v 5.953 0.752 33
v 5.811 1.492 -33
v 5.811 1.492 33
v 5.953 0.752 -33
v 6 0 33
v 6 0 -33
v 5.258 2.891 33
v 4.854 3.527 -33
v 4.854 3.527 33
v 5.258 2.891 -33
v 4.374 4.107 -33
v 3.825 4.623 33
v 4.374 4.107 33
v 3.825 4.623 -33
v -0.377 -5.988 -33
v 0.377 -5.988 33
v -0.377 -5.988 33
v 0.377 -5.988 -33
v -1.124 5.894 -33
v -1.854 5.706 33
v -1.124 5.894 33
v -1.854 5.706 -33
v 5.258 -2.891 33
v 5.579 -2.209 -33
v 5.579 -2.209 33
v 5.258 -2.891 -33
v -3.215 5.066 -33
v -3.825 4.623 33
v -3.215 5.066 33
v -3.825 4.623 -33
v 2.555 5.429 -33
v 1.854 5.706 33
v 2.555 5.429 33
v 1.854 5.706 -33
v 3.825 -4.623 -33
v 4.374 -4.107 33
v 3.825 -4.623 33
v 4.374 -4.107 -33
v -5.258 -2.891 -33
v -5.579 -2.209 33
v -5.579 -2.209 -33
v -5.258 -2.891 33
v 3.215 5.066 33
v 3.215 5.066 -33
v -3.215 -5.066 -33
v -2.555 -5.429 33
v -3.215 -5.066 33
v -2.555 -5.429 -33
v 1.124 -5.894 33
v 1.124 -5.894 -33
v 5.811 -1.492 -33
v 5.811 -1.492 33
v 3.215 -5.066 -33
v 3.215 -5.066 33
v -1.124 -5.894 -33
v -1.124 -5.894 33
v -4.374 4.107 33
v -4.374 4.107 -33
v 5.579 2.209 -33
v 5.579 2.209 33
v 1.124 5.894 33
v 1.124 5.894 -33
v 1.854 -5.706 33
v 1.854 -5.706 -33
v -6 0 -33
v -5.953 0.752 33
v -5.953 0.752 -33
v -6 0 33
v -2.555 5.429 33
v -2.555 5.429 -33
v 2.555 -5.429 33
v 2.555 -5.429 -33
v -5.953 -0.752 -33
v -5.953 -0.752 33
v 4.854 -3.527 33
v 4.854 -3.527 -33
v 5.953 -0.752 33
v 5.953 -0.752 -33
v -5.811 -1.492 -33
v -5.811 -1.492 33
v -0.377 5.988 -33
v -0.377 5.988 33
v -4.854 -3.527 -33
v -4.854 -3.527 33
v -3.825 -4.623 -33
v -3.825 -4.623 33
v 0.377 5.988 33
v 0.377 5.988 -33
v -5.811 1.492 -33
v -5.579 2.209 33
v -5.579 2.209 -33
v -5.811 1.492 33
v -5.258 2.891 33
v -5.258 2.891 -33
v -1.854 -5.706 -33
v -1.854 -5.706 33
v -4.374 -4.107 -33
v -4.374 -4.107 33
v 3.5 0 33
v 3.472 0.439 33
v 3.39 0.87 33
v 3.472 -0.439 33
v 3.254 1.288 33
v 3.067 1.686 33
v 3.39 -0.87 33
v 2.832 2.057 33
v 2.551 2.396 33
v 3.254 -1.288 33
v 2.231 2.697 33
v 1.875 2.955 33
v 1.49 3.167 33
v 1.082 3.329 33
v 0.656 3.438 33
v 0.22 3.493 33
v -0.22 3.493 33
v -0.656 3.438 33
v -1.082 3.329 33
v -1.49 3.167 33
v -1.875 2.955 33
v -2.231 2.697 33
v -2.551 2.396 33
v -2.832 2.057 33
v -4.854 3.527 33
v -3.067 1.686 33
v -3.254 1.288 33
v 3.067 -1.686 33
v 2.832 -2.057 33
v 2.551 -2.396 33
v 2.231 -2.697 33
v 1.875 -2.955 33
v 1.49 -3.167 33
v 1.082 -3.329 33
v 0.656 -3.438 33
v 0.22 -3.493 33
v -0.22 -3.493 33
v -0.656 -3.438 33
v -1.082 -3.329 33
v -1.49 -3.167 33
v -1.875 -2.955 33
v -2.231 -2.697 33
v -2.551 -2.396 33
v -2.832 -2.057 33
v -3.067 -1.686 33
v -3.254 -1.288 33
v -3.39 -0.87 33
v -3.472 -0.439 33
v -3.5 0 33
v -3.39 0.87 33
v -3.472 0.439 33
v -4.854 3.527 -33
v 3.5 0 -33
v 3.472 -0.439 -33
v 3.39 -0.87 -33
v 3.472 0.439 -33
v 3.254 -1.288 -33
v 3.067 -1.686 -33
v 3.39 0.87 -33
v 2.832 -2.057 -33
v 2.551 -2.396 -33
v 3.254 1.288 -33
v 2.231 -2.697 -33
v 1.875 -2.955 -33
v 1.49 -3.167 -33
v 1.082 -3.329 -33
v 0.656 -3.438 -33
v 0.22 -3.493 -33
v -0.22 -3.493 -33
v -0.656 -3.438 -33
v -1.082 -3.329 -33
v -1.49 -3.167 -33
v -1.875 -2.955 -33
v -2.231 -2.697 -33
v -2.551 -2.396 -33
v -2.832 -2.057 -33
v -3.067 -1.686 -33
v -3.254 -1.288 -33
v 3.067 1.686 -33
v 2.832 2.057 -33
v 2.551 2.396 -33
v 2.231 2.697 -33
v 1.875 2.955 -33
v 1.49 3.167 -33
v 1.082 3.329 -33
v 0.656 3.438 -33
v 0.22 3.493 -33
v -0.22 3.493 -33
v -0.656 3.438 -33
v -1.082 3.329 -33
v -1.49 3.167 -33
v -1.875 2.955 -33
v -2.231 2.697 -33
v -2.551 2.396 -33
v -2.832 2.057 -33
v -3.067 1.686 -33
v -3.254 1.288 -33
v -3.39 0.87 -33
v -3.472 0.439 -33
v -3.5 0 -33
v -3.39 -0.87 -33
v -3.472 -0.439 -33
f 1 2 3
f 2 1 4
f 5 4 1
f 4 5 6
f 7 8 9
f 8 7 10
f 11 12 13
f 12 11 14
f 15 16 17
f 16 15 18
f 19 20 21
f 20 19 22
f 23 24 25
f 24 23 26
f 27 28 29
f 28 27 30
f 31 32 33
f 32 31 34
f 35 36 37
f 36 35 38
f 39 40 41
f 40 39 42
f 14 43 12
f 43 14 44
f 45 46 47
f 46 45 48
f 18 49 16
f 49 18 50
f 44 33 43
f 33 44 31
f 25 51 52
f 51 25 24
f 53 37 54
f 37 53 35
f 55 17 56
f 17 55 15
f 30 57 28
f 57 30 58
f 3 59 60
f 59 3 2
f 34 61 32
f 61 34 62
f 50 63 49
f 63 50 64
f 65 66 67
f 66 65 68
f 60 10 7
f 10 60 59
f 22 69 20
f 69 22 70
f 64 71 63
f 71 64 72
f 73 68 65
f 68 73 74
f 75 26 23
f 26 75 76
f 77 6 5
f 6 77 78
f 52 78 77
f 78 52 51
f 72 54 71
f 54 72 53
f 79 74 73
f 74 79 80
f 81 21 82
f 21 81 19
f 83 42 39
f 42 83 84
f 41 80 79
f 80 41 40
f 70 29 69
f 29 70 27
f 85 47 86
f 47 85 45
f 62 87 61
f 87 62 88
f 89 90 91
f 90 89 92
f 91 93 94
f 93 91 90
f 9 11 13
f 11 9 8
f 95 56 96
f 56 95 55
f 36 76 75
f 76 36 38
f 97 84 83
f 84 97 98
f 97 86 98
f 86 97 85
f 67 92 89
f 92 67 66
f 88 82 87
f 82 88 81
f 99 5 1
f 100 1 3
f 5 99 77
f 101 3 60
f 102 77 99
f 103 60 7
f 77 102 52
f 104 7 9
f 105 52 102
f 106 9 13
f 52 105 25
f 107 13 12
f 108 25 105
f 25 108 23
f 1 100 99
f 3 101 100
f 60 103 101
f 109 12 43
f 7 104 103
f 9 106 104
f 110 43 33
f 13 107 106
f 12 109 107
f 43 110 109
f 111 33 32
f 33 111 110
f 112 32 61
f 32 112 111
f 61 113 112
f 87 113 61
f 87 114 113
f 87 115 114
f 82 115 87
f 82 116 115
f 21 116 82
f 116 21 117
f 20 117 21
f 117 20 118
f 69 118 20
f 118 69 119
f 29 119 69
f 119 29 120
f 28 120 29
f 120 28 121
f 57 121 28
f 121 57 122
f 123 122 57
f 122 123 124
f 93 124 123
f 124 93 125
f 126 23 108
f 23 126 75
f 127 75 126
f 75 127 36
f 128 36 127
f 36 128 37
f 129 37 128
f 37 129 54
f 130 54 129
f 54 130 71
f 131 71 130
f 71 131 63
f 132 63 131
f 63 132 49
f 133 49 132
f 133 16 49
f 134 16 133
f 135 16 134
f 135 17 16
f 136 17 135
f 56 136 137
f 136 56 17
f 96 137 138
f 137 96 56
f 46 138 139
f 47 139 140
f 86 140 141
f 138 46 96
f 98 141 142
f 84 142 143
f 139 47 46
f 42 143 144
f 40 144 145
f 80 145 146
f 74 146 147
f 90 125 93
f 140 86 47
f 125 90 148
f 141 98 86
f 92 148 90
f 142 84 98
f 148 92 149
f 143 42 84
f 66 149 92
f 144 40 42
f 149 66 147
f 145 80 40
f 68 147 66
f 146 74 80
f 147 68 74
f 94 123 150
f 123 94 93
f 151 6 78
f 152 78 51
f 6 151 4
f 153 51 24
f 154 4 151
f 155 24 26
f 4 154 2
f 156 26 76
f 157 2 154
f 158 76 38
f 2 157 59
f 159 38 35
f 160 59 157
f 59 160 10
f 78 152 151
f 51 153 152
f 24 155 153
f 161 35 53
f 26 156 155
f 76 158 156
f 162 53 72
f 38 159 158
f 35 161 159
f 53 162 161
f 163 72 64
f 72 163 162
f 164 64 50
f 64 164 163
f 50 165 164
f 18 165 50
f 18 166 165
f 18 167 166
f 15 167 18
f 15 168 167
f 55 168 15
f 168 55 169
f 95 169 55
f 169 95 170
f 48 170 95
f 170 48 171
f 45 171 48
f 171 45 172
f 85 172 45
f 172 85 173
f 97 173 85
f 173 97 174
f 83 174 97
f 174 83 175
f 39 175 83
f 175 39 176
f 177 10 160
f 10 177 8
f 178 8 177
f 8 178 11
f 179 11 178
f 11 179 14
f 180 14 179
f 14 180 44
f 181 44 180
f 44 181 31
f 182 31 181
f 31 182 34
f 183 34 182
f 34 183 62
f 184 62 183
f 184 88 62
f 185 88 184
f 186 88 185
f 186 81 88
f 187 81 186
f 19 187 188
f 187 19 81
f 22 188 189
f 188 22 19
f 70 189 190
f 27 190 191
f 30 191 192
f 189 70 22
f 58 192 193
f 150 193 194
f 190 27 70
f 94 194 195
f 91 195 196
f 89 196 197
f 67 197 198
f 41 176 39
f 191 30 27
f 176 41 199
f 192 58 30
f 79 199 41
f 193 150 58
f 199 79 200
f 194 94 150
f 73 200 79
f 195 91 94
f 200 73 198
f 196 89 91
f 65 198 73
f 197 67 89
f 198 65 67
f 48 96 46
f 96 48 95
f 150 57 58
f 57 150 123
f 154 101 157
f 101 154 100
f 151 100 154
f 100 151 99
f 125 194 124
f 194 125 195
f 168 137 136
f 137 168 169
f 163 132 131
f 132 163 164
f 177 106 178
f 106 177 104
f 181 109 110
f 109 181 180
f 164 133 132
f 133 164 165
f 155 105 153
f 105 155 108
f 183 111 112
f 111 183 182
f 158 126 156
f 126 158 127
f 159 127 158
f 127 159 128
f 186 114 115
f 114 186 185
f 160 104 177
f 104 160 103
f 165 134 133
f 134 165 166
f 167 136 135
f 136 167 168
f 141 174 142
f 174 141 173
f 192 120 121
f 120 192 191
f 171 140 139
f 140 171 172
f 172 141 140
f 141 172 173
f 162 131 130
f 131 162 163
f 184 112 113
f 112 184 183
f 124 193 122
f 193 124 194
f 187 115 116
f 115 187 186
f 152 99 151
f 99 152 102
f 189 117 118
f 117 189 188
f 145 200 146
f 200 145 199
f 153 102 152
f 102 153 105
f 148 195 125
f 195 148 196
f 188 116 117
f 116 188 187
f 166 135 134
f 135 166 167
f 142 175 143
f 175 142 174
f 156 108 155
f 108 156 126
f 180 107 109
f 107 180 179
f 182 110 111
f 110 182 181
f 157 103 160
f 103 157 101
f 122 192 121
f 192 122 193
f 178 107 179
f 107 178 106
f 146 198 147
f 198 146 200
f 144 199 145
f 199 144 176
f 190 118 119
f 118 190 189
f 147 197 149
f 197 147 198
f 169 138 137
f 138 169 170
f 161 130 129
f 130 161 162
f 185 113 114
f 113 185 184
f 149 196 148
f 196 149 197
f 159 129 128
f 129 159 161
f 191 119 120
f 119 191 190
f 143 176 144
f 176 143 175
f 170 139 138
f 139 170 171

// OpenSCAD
$fn = 50;


difference() {
	union() {
		translate(v = [0, 0, -33.0000000000]) {
			cylinder(h = 66, r = 6.0000000000);
		}
	}
	union() {
		translate(v = [0, 0, -100.0000000000]) {
			cylinder(h = 200, r = 3.5000000000);
		}
	}
}
